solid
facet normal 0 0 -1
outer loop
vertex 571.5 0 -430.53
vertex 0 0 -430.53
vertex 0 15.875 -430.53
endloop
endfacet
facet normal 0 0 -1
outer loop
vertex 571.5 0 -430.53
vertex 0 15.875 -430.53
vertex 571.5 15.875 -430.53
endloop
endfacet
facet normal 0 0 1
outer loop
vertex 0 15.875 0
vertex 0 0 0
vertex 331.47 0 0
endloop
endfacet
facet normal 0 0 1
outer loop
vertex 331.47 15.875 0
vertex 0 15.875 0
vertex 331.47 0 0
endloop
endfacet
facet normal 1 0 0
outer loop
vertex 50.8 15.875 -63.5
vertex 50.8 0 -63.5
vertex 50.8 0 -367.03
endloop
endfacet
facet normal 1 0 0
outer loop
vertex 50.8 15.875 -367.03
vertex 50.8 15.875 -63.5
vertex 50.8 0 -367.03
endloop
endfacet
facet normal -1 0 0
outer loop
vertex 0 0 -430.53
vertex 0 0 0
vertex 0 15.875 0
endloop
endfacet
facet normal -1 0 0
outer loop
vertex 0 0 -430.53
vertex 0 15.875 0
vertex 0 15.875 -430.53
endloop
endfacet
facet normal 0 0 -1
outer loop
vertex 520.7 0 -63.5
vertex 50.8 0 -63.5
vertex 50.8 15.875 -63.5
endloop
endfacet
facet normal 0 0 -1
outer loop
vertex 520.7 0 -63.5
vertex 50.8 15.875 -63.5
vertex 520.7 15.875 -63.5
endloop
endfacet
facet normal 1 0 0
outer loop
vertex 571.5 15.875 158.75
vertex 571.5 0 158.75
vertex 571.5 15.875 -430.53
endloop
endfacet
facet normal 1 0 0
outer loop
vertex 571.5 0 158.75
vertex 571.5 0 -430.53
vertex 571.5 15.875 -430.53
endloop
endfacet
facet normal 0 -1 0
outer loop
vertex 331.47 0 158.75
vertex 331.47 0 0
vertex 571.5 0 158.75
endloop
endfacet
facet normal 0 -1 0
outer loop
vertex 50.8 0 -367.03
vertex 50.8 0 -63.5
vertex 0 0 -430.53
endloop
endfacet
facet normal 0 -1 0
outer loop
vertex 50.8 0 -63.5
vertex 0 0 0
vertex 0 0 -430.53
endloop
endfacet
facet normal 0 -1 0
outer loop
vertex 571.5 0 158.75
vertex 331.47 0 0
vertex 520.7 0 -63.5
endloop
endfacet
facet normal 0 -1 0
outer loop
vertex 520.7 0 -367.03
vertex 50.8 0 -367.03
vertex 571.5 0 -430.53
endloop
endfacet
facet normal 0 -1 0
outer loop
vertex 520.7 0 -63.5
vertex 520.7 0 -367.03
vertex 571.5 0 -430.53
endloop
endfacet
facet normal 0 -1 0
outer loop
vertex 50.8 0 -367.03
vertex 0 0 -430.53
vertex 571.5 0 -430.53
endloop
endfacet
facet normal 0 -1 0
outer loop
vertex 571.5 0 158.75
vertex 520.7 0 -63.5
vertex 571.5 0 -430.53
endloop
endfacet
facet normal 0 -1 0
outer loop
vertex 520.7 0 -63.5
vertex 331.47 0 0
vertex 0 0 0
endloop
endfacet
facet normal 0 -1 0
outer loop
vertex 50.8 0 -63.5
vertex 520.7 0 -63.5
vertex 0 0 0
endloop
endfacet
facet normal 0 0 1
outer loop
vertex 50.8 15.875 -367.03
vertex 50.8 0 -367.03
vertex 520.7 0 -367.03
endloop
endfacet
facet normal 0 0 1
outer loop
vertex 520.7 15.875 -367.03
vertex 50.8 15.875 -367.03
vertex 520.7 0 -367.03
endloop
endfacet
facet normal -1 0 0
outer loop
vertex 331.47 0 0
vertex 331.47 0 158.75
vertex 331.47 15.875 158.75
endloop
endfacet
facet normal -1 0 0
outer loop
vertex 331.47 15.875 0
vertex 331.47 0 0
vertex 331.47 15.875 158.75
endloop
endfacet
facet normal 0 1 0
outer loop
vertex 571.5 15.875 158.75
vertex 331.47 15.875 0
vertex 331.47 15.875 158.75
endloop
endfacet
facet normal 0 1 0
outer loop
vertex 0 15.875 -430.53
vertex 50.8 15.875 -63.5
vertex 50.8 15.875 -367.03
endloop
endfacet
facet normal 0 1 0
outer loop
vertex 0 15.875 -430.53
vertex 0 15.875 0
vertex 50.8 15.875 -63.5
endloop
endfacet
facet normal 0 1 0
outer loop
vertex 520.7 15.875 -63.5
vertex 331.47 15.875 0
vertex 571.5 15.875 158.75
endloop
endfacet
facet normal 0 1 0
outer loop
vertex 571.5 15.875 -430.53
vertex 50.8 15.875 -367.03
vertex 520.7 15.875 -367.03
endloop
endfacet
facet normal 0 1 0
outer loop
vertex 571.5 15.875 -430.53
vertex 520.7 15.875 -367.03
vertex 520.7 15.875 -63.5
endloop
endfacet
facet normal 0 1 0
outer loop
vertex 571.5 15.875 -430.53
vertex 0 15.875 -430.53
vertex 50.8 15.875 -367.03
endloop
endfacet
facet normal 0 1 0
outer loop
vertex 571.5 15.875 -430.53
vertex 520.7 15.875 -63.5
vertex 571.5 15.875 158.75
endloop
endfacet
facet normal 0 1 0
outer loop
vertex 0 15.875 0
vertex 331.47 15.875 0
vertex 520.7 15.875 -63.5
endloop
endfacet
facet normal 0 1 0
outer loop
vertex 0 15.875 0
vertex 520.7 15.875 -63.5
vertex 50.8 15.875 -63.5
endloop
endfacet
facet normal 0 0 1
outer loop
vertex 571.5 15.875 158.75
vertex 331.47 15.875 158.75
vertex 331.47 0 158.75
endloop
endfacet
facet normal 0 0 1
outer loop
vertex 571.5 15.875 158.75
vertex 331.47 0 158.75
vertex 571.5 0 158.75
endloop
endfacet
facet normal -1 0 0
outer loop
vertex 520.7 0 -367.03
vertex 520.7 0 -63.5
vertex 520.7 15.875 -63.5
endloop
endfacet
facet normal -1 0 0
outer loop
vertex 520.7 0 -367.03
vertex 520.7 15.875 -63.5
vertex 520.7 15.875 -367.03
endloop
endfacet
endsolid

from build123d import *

# Parameters (mm, degrees)
SKETCH1_W           = 571.5
SKETCH1_H           = 430.53
SKETCH1_W_2         = 469.9
SKETCH1_H_2         = 303.53
BOSS_EXTRUDE1_DEPTH = 15.875
SKETCH2_W           = 240.03
SKETCH2_H           = 15.875
BOSS_EXTRUDE2_DEPTH = 158.75


with BuildPart() as part:
    # Sketch1 → Boss-Extrude1 (new body)
    with BuildSketch(Plane(origin=(0, 0, 0), x_dir=(1, 0, 0), z_dir=(0, 1, 0))):
        with Locations((285.75, 215.265)):
            Rectangle(SKETCH1_W, SKETCH1_H)
        with Locations((285.75, 215.265)):
            Rectangle(SKETCH1_W_2, SKETCH1_H_2, mode=Mode.SUBTRACT)
    extrude(amount=BOSS_EXTRUDE1_DEPTH)

    # Sketch2 → Boss-Extrude2 (add)
    with BuildSketch(Plane.XY):
        with Locations((451.485, 7.9375)):
            Rectangle(SKETCH2_W, SKETCH2_H)
    extrude(amount=BOSS_EXTRUDE2_DEPTH)


solid = part.part
